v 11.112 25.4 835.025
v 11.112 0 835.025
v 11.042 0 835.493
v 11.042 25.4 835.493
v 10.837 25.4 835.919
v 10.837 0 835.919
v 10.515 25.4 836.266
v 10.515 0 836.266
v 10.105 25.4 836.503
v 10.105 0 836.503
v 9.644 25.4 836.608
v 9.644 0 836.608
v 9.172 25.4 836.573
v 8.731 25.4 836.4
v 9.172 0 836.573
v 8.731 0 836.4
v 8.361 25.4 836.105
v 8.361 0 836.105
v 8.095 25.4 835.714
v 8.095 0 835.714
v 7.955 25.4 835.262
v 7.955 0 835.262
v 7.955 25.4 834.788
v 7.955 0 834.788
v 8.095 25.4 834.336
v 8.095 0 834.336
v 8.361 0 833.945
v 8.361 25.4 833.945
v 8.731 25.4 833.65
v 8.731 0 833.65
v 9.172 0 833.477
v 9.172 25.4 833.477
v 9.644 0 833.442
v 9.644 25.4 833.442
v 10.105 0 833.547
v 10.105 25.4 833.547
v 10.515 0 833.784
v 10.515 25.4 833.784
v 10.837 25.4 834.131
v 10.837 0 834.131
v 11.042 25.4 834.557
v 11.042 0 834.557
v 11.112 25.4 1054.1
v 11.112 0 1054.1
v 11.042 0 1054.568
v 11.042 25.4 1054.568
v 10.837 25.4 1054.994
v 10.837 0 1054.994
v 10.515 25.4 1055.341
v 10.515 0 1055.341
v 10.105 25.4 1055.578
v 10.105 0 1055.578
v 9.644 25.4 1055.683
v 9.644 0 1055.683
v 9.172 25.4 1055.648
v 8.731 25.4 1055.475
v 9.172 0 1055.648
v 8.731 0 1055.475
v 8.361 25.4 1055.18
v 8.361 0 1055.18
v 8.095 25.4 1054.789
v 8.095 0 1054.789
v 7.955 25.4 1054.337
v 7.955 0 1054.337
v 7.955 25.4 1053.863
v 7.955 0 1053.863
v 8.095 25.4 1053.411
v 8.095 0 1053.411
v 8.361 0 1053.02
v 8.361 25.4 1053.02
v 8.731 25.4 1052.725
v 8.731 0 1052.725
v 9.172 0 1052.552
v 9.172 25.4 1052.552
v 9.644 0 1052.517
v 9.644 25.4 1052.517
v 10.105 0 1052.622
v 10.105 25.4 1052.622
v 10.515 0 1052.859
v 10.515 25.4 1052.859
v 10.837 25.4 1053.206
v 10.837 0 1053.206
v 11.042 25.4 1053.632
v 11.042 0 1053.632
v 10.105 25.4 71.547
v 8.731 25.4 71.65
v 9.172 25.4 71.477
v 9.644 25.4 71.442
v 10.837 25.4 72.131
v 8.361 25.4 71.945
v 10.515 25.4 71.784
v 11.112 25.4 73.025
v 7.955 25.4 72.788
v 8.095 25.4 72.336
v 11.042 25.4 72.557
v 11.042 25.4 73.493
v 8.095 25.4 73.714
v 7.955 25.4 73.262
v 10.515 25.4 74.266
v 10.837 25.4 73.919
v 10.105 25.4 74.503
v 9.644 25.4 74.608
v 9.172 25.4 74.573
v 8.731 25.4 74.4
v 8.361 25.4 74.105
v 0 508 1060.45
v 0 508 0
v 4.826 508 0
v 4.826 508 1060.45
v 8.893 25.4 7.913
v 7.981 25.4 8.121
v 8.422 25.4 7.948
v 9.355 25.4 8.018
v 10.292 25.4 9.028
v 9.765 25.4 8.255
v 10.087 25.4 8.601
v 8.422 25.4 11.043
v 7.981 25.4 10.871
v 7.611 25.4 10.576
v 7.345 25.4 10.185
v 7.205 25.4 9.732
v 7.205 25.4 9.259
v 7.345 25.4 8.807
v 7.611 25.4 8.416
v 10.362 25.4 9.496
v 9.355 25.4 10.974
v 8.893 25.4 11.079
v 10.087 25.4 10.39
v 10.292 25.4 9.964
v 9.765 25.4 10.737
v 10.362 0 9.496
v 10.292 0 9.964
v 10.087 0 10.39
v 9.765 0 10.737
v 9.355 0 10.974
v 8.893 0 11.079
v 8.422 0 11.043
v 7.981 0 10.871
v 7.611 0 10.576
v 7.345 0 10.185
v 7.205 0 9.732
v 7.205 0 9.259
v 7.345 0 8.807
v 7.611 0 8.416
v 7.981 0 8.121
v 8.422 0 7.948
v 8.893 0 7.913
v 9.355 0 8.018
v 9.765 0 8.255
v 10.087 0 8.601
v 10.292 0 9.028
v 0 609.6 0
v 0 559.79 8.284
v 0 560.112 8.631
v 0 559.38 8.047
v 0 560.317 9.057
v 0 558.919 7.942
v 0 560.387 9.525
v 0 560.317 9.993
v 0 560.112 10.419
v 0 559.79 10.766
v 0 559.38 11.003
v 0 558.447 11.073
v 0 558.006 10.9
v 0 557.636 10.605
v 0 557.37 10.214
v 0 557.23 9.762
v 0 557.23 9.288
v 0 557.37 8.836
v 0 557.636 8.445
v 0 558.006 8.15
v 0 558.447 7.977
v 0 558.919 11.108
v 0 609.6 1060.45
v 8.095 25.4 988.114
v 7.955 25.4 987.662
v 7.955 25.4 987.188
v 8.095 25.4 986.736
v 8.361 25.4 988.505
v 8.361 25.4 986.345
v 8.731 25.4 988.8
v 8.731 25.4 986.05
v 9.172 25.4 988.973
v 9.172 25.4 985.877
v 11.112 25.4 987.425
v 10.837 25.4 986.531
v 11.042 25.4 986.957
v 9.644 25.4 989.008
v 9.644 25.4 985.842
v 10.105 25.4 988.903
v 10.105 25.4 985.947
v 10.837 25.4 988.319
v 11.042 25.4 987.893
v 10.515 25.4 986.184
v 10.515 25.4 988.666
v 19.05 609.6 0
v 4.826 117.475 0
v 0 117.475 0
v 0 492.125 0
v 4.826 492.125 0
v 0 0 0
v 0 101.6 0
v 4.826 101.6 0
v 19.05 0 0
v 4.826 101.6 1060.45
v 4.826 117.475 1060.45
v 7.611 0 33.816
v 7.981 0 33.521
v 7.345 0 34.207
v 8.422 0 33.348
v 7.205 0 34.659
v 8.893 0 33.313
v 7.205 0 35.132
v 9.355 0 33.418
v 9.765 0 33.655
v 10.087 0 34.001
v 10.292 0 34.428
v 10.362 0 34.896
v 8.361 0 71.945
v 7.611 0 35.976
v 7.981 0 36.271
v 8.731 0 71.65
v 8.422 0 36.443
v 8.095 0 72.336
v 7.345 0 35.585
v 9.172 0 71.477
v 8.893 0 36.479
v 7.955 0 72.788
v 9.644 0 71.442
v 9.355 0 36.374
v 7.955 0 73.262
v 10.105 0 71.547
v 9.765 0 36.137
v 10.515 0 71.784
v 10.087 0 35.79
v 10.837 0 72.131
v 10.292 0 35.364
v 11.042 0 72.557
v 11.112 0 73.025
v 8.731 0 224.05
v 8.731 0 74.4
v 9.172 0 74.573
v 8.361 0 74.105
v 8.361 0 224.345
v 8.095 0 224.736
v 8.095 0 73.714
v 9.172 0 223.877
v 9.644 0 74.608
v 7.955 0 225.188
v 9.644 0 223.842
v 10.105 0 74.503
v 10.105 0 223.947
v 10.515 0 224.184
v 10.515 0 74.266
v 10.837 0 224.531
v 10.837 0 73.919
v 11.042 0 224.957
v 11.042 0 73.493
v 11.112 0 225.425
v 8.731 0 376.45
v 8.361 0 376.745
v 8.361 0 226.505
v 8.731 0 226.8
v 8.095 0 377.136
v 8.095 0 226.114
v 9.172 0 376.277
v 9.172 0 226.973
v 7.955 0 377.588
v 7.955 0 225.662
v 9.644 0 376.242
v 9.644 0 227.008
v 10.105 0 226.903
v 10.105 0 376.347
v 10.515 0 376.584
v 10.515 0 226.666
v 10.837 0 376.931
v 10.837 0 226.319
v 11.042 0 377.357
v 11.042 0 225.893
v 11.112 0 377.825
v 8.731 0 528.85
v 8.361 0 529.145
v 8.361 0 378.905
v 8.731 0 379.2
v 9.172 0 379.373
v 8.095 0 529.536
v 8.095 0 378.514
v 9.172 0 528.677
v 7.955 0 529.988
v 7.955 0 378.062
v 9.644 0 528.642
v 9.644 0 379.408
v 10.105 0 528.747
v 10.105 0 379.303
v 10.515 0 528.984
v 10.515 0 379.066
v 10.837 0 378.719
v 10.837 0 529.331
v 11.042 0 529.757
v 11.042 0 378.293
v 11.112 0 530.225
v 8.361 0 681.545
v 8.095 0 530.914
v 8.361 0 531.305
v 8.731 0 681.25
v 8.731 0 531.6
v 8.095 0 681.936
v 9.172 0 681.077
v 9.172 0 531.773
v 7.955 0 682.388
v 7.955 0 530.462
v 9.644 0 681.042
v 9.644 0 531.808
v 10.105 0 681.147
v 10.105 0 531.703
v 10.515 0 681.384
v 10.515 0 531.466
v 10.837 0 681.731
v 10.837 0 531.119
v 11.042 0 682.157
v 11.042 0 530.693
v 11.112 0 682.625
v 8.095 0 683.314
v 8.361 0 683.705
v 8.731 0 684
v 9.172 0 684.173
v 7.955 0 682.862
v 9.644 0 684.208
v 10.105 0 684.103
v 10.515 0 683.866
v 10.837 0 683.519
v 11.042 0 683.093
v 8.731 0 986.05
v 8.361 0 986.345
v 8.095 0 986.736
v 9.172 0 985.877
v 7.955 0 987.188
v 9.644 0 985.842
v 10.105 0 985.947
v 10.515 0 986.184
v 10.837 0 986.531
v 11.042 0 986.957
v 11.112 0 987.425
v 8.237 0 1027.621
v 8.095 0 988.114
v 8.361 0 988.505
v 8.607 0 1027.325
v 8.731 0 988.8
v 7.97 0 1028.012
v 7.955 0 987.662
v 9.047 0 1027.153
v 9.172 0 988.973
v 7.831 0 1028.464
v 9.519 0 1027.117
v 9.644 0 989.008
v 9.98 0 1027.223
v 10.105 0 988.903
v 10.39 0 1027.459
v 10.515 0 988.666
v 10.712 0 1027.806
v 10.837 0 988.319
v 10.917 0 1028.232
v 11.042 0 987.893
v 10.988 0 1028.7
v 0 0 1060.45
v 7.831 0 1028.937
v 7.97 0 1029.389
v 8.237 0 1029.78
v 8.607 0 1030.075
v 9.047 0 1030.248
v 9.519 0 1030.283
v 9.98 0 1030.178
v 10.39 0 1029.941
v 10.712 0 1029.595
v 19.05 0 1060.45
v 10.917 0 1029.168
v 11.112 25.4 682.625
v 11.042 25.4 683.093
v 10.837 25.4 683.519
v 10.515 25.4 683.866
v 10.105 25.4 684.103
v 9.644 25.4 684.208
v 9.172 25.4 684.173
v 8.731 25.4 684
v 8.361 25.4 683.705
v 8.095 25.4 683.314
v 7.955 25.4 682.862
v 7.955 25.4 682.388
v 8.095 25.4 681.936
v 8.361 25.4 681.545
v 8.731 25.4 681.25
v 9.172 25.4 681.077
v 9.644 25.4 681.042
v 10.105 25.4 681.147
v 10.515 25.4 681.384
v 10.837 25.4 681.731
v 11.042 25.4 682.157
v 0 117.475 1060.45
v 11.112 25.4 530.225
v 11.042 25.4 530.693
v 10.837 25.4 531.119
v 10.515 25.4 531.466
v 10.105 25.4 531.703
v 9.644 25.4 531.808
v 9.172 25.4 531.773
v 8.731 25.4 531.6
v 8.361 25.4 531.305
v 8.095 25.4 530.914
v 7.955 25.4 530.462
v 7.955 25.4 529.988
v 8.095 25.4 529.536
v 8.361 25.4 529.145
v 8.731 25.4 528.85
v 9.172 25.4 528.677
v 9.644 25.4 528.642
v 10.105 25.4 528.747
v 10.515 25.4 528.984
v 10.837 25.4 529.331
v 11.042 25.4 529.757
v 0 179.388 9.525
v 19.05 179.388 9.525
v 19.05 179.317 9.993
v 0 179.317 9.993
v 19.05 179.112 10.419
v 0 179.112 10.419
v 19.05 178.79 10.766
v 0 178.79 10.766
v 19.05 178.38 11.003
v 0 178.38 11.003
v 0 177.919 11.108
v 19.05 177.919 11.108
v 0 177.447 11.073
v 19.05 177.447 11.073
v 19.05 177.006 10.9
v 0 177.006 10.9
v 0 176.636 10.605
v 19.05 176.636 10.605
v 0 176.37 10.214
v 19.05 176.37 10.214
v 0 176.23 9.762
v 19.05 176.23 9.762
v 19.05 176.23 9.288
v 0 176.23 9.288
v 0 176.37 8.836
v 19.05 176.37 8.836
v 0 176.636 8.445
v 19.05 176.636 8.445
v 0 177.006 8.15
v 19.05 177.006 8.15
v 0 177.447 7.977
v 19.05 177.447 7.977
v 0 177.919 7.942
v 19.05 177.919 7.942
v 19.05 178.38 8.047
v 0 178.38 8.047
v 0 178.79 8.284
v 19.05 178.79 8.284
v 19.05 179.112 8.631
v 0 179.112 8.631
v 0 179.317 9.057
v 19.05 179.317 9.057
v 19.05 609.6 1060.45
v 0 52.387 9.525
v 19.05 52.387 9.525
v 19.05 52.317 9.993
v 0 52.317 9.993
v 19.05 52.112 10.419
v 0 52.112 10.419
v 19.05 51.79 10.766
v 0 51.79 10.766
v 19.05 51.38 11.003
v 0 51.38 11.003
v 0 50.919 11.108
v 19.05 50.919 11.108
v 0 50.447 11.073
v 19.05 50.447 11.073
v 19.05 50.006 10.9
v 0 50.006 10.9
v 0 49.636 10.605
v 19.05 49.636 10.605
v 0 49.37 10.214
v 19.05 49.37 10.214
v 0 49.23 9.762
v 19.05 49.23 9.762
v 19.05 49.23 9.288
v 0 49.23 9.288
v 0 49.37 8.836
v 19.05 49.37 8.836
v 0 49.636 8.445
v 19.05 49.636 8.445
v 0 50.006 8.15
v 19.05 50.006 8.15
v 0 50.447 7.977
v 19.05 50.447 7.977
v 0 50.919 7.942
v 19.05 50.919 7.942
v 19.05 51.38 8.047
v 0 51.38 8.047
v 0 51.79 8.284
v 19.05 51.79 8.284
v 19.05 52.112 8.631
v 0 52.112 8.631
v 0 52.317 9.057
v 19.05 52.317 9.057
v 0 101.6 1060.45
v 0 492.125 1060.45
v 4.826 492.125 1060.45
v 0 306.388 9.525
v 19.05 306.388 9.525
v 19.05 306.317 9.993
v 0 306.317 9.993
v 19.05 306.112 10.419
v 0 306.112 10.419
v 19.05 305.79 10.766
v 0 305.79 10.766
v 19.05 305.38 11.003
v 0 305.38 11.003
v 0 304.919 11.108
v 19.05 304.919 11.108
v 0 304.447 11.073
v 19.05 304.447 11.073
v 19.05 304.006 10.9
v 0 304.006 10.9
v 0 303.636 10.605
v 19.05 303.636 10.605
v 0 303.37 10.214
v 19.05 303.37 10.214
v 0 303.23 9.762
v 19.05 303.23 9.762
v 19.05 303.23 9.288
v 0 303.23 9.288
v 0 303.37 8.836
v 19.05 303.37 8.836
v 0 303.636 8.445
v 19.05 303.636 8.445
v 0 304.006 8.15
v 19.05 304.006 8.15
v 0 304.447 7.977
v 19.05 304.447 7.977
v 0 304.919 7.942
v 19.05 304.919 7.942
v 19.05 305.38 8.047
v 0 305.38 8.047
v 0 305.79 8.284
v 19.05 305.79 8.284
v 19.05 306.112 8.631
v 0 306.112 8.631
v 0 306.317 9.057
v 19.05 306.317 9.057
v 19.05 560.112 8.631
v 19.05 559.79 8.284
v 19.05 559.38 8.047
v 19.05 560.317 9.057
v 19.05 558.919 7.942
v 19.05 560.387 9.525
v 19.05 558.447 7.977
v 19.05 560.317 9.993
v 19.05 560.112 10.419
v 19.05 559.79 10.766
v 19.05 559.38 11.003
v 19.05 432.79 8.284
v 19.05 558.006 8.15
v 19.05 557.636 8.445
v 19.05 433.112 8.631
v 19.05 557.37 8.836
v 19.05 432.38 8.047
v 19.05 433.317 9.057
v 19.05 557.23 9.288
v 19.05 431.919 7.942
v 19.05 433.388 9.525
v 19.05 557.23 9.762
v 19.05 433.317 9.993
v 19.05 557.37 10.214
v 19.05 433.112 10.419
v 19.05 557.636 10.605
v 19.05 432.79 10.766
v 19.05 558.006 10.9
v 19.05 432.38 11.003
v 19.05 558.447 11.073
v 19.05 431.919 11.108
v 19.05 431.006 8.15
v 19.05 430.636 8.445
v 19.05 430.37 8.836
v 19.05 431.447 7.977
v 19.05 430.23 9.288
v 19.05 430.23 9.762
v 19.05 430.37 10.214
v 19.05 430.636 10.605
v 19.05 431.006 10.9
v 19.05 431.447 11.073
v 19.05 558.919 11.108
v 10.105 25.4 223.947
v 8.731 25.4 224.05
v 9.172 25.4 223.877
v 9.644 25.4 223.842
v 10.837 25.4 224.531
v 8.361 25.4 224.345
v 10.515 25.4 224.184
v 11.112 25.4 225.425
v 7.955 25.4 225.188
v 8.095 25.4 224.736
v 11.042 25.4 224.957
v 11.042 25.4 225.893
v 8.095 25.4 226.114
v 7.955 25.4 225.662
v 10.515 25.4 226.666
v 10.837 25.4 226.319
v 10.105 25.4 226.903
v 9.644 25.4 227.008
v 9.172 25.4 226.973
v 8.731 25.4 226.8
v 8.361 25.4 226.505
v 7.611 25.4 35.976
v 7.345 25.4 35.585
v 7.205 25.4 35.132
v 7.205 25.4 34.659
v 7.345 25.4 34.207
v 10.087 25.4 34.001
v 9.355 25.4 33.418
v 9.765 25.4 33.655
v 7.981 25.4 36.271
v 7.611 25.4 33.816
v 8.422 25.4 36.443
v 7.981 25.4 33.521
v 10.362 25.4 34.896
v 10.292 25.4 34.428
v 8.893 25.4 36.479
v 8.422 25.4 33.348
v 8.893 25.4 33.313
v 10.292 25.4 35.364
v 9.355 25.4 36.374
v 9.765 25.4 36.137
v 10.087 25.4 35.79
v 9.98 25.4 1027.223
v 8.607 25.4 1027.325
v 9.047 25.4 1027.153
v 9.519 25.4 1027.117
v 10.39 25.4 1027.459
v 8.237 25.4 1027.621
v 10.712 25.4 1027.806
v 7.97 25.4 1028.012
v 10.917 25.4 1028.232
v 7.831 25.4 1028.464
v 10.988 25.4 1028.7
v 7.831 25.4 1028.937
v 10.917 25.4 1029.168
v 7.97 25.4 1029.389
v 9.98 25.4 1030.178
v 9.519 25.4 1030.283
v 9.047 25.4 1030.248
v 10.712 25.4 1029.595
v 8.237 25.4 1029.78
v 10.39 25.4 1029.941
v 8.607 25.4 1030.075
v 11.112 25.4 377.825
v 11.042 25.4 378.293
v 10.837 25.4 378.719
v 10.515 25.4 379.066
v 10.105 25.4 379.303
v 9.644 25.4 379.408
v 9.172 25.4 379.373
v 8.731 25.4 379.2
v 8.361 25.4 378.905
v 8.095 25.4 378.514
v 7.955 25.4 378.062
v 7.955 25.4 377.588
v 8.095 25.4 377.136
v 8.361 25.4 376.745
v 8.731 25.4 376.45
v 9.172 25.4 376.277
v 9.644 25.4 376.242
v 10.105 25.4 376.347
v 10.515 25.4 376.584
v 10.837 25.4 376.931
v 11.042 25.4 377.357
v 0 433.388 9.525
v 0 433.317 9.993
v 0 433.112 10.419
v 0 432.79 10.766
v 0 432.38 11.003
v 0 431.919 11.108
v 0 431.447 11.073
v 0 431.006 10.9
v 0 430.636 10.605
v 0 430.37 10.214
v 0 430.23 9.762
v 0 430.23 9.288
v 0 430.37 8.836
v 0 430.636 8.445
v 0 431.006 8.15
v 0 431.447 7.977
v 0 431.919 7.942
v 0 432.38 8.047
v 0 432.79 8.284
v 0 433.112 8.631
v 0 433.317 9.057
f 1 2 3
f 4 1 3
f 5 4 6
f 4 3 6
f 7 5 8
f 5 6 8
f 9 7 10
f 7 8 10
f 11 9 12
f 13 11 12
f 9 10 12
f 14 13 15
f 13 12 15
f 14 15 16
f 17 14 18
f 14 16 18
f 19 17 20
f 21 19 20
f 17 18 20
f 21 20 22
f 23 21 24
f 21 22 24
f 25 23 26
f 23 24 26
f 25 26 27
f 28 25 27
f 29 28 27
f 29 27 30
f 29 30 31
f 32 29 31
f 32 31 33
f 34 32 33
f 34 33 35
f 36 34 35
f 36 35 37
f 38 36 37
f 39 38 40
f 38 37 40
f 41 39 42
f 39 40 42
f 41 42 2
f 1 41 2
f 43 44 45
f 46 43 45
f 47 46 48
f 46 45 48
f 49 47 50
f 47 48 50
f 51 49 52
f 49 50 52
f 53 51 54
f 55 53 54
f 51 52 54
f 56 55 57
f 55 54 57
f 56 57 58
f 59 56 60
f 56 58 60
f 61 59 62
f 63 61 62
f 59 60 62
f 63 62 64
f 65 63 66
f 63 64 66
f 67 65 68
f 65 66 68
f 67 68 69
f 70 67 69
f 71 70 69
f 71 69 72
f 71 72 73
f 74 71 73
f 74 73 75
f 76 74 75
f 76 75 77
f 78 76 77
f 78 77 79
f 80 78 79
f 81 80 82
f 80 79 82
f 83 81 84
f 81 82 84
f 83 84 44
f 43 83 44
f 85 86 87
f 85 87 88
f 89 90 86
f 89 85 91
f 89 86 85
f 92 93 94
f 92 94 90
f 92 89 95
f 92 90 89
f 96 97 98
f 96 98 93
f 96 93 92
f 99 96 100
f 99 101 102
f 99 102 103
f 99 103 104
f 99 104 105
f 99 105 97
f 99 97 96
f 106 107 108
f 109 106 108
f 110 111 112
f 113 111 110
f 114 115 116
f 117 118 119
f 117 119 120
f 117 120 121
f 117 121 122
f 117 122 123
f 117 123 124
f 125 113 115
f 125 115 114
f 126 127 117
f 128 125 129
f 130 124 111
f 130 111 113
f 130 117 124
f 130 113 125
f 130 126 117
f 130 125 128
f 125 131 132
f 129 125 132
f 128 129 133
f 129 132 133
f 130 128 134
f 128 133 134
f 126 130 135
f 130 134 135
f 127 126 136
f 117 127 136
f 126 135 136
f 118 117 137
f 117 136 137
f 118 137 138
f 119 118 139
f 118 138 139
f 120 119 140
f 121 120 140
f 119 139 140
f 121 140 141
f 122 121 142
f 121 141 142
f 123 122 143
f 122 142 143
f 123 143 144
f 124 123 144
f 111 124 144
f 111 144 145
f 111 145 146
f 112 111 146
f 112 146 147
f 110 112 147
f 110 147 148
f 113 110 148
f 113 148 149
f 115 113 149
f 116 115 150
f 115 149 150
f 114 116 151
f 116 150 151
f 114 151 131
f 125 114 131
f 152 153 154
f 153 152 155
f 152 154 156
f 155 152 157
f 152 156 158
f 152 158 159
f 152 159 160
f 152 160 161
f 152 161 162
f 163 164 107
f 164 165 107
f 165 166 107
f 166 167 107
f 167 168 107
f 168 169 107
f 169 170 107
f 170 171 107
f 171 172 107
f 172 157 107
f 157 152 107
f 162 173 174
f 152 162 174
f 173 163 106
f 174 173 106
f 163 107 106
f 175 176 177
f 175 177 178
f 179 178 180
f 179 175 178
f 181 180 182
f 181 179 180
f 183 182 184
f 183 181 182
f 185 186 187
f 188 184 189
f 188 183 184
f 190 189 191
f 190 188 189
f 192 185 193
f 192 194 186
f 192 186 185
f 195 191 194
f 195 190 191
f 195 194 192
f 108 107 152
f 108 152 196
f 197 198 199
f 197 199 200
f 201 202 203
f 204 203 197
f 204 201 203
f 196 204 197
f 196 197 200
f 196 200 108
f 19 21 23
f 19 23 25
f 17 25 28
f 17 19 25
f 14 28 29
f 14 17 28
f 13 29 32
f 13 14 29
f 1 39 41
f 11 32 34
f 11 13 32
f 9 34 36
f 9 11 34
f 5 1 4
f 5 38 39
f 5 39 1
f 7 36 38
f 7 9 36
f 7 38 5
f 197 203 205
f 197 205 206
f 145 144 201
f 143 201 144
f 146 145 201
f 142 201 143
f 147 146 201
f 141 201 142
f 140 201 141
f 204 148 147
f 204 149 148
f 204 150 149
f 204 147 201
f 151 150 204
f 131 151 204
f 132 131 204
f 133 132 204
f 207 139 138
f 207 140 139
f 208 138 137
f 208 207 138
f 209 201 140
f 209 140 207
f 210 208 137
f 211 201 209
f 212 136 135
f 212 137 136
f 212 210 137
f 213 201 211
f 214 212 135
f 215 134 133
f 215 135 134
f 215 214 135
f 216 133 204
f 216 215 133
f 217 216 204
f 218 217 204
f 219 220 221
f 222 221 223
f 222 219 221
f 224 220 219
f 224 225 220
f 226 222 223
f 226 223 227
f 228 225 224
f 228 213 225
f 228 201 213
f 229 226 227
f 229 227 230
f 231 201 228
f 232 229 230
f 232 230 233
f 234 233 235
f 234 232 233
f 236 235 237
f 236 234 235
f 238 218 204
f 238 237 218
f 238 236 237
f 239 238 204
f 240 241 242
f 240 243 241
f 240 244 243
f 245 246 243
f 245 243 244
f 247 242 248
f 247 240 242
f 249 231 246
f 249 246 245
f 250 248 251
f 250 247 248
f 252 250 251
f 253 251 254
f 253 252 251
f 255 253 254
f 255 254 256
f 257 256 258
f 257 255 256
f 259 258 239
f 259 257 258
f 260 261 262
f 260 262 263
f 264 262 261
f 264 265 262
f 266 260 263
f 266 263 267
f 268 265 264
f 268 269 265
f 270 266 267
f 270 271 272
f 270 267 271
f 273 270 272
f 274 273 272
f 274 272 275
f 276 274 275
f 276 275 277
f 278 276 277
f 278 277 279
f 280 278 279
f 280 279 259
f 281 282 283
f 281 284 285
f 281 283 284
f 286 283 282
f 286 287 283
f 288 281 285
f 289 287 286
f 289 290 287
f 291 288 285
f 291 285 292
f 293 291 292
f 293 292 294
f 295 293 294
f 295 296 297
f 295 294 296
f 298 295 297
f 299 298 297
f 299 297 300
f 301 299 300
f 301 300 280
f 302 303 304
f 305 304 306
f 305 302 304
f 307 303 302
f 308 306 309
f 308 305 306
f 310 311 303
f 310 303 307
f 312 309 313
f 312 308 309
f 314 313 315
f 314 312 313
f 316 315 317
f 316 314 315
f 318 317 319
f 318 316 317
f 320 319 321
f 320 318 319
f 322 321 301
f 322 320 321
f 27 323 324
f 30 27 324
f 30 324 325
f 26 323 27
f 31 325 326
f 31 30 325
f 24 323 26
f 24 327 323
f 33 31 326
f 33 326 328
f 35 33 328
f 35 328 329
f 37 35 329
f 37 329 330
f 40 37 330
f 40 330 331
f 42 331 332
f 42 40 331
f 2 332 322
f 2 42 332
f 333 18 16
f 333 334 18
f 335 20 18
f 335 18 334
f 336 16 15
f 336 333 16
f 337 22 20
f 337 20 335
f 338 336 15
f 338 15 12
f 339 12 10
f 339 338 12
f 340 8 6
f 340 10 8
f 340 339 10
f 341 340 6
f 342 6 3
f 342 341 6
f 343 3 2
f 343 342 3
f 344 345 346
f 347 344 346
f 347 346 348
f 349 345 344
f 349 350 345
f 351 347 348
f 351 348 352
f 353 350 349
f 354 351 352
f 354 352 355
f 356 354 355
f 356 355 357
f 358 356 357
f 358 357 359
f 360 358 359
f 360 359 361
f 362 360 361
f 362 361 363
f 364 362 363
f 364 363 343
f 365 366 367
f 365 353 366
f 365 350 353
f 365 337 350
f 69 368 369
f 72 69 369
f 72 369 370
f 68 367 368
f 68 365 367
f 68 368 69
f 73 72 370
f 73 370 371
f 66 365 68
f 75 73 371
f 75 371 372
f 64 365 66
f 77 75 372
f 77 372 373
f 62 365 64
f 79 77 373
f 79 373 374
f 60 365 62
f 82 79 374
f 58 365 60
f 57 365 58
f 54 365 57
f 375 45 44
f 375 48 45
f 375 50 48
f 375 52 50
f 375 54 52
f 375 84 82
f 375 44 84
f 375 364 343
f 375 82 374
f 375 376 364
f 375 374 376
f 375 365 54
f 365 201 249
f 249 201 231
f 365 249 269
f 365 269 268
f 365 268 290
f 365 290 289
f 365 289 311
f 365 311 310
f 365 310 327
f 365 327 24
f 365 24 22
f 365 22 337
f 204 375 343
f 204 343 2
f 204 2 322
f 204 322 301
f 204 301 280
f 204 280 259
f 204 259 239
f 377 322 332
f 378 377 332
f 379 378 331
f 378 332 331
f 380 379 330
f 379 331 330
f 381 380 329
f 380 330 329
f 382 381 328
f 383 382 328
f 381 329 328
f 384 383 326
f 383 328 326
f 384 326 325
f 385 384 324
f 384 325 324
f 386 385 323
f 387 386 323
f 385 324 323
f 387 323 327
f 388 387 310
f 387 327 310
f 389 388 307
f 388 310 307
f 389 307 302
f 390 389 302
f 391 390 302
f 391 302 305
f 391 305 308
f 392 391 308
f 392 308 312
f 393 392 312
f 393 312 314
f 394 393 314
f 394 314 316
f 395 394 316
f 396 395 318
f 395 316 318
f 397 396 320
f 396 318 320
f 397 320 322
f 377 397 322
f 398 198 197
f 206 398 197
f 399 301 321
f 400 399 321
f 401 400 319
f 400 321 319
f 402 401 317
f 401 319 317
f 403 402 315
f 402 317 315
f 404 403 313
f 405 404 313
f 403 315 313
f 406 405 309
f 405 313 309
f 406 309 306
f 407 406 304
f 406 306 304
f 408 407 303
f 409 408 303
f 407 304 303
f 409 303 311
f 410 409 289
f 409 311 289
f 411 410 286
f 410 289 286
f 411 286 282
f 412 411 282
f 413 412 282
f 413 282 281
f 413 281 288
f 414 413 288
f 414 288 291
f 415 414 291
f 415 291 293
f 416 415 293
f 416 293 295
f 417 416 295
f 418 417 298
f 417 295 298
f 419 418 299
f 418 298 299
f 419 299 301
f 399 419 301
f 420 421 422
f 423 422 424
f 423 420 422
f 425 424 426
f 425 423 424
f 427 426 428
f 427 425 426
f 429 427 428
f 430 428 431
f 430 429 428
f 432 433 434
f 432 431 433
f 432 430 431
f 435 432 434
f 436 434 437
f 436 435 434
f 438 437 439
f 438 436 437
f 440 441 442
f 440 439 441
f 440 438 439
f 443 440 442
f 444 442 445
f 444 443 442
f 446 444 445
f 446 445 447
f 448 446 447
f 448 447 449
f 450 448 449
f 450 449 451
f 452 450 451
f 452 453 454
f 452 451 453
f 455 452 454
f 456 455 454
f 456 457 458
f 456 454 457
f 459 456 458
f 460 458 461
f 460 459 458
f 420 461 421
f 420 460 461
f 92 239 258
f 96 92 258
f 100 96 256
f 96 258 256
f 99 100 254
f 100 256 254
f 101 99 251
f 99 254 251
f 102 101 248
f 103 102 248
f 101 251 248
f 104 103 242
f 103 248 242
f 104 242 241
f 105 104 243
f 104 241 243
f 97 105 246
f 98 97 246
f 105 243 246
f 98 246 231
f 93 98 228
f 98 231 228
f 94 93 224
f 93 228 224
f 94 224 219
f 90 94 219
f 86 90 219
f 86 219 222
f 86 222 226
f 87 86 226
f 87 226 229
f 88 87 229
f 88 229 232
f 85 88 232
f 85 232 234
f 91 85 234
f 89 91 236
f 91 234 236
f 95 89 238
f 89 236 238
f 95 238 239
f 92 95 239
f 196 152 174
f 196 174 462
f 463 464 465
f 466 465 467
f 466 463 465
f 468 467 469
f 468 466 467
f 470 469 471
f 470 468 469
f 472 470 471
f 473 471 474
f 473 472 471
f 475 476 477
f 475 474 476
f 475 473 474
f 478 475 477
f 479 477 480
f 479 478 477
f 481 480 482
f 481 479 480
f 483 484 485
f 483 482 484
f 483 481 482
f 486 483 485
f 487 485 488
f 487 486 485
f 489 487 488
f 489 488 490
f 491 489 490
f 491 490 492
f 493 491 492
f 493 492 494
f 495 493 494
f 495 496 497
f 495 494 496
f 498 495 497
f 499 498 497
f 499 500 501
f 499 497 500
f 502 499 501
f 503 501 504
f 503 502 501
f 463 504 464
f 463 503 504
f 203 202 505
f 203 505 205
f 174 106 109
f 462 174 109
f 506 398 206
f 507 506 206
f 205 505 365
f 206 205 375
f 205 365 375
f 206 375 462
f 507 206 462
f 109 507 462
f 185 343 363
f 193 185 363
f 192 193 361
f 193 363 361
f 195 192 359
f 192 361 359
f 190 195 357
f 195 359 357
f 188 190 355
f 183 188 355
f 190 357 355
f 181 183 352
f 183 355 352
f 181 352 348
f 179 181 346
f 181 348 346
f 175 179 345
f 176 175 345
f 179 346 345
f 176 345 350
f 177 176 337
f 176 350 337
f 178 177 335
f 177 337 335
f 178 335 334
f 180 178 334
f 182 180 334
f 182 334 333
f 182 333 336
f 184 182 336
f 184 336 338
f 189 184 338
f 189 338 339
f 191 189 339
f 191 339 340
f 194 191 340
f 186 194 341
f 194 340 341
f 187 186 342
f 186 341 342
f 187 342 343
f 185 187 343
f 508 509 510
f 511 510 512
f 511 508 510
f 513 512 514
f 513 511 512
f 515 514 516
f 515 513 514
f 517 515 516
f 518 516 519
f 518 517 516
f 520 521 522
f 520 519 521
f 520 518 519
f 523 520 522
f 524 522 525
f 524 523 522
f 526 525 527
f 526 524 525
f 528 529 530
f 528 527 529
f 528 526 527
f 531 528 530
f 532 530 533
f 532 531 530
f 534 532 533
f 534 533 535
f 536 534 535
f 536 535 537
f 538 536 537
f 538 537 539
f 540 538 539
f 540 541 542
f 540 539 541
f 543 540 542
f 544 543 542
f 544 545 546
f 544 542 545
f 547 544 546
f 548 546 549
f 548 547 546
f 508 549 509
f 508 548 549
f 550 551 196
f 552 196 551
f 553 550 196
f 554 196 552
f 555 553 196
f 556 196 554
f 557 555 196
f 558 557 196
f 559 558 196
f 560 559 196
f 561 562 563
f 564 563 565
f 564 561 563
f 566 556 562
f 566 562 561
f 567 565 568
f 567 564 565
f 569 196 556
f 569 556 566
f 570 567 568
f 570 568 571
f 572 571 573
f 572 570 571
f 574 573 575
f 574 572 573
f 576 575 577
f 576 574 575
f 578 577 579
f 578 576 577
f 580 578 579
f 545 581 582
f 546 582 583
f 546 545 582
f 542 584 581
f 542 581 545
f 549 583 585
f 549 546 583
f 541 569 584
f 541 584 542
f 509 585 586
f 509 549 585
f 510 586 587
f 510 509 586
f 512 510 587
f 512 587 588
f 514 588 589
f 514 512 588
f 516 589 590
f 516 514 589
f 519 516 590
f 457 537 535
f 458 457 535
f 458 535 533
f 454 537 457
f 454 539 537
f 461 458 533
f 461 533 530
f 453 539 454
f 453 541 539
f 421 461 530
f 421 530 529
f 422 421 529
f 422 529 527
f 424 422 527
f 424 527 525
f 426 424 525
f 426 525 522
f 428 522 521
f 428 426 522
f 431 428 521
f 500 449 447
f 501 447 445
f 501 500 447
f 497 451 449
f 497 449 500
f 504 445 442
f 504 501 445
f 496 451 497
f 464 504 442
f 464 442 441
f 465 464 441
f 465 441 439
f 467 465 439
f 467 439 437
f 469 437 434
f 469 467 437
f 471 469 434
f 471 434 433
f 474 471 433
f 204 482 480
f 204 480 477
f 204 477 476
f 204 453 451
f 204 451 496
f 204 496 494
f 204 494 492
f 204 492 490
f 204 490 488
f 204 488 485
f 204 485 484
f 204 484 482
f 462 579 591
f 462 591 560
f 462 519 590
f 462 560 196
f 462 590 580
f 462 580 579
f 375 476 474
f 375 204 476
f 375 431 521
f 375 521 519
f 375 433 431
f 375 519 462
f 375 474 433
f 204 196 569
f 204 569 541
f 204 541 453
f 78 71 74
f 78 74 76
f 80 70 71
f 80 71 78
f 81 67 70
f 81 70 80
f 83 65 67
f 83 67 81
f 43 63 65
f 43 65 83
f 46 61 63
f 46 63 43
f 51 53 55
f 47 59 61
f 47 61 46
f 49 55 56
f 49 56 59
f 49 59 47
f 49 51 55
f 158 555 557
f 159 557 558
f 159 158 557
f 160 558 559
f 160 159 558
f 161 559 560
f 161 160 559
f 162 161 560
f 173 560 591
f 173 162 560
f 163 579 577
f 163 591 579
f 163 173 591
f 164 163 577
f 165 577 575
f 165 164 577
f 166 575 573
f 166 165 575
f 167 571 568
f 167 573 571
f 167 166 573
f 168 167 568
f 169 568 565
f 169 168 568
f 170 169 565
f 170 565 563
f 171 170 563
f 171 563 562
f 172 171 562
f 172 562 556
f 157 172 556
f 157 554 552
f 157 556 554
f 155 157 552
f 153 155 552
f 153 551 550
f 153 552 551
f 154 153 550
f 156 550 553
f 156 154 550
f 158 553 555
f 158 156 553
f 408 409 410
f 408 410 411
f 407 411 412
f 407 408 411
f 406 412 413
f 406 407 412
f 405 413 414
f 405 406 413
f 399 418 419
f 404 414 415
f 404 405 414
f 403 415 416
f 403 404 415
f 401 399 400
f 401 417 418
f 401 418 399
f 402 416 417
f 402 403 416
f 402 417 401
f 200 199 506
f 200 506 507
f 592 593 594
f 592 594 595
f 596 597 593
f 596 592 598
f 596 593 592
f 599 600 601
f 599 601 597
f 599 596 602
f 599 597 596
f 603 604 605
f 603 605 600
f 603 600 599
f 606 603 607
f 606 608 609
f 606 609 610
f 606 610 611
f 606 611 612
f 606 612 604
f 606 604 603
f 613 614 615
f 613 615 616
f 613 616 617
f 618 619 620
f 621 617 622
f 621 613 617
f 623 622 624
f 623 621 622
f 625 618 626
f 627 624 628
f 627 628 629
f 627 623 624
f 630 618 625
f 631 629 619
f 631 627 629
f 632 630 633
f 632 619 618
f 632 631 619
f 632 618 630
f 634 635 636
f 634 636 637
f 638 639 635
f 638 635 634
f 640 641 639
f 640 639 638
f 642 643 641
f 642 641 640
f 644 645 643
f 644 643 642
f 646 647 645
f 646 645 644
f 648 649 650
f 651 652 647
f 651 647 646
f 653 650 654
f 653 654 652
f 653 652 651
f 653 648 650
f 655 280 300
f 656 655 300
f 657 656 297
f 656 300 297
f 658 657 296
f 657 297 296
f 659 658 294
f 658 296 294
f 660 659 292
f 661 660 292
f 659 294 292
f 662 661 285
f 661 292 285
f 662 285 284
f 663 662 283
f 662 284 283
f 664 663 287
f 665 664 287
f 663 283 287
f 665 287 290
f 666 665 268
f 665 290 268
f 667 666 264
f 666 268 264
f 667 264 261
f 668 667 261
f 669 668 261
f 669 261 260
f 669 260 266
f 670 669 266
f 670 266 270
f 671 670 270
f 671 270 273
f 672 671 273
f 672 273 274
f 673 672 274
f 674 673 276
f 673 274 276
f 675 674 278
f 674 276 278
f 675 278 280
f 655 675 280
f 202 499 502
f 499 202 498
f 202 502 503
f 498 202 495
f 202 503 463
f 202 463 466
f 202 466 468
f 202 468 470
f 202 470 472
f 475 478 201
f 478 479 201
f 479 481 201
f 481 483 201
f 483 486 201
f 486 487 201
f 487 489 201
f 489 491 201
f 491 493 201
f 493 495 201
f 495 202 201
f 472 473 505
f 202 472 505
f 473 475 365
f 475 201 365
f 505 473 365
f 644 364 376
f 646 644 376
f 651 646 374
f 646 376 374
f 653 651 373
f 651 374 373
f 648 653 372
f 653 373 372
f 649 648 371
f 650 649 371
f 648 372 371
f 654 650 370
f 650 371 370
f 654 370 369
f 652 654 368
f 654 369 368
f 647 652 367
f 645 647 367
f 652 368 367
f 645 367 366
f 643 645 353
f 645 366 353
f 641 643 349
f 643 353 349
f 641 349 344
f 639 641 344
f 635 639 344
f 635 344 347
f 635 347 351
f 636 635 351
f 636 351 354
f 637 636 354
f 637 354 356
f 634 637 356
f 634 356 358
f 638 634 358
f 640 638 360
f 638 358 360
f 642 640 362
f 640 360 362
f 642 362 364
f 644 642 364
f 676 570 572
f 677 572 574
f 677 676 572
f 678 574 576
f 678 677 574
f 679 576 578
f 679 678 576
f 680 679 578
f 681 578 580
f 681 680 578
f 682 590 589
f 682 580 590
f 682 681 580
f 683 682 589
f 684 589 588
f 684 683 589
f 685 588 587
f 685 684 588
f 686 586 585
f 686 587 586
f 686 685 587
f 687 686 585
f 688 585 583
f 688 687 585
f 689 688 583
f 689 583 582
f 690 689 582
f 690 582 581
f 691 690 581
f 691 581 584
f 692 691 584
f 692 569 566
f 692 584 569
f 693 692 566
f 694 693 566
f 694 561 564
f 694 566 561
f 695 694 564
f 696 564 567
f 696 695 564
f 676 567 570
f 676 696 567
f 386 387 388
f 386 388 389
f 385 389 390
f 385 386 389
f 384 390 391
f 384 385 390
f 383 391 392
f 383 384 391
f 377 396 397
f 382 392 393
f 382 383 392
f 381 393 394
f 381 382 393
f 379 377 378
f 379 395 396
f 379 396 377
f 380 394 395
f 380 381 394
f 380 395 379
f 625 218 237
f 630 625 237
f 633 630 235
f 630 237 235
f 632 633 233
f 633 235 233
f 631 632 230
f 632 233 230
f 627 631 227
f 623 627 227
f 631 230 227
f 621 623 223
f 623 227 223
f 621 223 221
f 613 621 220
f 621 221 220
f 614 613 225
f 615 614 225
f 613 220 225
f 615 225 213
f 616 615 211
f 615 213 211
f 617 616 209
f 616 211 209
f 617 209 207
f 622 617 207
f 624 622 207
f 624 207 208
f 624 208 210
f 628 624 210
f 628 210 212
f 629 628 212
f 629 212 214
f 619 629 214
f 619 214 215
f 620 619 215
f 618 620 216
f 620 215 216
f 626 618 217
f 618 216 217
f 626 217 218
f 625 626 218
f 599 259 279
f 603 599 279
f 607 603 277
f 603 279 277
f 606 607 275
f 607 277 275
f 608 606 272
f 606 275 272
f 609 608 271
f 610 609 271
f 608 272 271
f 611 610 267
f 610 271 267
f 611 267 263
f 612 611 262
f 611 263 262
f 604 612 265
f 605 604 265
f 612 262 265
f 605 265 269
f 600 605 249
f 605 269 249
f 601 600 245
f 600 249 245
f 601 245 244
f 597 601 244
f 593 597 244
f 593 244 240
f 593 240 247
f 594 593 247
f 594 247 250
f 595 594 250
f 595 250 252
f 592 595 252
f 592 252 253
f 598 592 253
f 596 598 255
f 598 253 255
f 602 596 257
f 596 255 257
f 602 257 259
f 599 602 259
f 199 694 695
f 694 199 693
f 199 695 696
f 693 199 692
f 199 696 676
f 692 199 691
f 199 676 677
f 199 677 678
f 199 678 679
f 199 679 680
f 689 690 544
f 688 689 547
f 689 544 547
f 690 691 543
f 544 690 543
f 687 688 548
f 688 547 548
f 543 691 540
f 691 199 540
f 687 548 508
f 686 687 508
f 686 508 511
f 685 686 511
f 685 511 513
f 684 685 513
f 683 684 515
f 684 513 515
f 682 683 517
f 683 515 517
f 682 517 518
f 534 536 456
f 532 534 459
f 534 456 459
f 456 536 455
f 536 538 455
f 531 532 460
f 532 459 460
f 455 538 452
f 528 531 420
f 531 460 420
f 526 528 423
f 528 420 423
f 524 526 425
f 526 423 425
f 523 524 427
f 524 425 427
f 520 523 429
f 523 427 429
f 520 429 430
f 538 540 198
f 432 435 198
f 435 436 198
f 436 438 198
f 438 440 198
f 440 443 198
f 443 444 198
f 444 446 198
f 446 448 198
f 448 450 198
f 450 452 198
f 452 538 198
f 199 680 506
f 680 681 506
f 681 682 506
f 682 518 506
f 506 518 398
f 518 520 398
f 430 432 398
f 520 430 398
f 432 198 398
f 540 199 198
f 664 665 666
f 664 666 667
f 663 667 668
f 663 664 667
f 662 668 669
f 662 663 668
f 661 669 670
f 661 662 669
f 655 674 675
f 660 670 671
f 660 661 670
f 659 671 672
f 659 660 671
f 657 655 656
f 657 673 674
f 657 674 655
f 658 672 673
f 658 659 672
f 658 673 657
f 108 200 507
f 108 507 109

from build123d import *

# Parameters (mm, degrees)
F0_W      = 19.05
F0_H      = 1060.45
F1_DEPTH  = 609.6
F2_R      = 1.5875
F3_DEPTH  = 19.051
F4_R      = 1.5875
F5_DEPTH  = 25.4
F6_R      = 1.5875
F7_DEPTH  = 25.4
F8_R      = 1.5875
F9_DEPTH  = 25.4
F10_W     = 4.826
F10_H     = 15.875
F11_DEPTH = 1060.451
F12_W     = 4.826
F12_H     = 15.875
F13_DEPTH = 1060.451


with BuildPart() as f1:
    # F0 (on Front) → F1 (new body)
    with BuildSketch(Plane.XZ):
        with Locations((9.525, 530.225)):
            Rectangle(F0_W, F0_H)
    extrude(amount=-F1_DEPTH)

    # F2 (on Right) → F3 (cut, through all)
    with BuildSketch(Plane.YZ):
        with Locations((50.8, 9.525)):
            Circle(F2_R)
        with Locations((177.8, 9.525)):
            Circle(F2_R)
        with Locations((304.8, 9.525)):
            Circle(F2_R)
        with Locations((431.8, 9.525)):
            Circle(F2_R)
        with Locations((558.8, 9.525)):
            Circle(F2_R)
    extrude(amount=F3_DEPTH, mode=Mode.SUBTRACT)

    # F4 (on Front) → F5 (cut)
    with BuildSketch(Plane.XZ):
        with Locations((9.525, 1054.1)):
            Circle(F4_R)
        with Locations((9.400492, 1028.700305)):
            Circle(F4_R)
    extrude(amount=-F5_DEPTH, mode=Mode.SUBTRACT)

    # F6 (on Front) → F7 (cut)
    with BuildSketch(Plane.XZ):
        with Locations((8.774849, 9.495769)):
            Circle(F6_R)
        with Locations((8.774849, 34.895769)):
            Circle(F6_R)
    extrude(amount=-F7_DEPTH, mode=Mode.SUBTRACT)

    # F8 (on Front) → F9 (cut)
    with BuildSketch(Plane.XZ):
        with Locations((9.525, 987.425)):
            Circle(F8_R)
        with Locations((9.525, 835.025)):
            Circle(F8_R)
        with Locations((9.525, 682.625)):
            Circle(F8_R)
        with Locations((9.525, 530.225)):
            Circle(F8_R)
        with Locations((9.525, 377.825)):
            Circle(F8_R)
        with Locations((9.525, 225.425)):
            Circle(F8_R)
        with Locations((9.525, 73.025)):
            Circle(F8_R)
    extrude(amount=-F9_DEPTH, mode=Mode.SUBTRACT)

    # F10 (on Top) → F11 (cut, through all)
    with BuildSketch(Plane.XY):
        with Locations((2.413, 109.5375)):
            Rectangle(F10_W, F10_H)
    extrude(amount=F11_DEPTH, mode=Mode.SUBTRACT)

    # F12 (on Top) → F13 (cut, through all)
    with BuildSketch(Plane.XY):
        with Locations((2.413, 500.0625)):
            Rectangle(F12_W, F12_H)
    extrude(amount=F13_DEPTH, mode=Mode.SUBTRACT)


solid = f1.part
